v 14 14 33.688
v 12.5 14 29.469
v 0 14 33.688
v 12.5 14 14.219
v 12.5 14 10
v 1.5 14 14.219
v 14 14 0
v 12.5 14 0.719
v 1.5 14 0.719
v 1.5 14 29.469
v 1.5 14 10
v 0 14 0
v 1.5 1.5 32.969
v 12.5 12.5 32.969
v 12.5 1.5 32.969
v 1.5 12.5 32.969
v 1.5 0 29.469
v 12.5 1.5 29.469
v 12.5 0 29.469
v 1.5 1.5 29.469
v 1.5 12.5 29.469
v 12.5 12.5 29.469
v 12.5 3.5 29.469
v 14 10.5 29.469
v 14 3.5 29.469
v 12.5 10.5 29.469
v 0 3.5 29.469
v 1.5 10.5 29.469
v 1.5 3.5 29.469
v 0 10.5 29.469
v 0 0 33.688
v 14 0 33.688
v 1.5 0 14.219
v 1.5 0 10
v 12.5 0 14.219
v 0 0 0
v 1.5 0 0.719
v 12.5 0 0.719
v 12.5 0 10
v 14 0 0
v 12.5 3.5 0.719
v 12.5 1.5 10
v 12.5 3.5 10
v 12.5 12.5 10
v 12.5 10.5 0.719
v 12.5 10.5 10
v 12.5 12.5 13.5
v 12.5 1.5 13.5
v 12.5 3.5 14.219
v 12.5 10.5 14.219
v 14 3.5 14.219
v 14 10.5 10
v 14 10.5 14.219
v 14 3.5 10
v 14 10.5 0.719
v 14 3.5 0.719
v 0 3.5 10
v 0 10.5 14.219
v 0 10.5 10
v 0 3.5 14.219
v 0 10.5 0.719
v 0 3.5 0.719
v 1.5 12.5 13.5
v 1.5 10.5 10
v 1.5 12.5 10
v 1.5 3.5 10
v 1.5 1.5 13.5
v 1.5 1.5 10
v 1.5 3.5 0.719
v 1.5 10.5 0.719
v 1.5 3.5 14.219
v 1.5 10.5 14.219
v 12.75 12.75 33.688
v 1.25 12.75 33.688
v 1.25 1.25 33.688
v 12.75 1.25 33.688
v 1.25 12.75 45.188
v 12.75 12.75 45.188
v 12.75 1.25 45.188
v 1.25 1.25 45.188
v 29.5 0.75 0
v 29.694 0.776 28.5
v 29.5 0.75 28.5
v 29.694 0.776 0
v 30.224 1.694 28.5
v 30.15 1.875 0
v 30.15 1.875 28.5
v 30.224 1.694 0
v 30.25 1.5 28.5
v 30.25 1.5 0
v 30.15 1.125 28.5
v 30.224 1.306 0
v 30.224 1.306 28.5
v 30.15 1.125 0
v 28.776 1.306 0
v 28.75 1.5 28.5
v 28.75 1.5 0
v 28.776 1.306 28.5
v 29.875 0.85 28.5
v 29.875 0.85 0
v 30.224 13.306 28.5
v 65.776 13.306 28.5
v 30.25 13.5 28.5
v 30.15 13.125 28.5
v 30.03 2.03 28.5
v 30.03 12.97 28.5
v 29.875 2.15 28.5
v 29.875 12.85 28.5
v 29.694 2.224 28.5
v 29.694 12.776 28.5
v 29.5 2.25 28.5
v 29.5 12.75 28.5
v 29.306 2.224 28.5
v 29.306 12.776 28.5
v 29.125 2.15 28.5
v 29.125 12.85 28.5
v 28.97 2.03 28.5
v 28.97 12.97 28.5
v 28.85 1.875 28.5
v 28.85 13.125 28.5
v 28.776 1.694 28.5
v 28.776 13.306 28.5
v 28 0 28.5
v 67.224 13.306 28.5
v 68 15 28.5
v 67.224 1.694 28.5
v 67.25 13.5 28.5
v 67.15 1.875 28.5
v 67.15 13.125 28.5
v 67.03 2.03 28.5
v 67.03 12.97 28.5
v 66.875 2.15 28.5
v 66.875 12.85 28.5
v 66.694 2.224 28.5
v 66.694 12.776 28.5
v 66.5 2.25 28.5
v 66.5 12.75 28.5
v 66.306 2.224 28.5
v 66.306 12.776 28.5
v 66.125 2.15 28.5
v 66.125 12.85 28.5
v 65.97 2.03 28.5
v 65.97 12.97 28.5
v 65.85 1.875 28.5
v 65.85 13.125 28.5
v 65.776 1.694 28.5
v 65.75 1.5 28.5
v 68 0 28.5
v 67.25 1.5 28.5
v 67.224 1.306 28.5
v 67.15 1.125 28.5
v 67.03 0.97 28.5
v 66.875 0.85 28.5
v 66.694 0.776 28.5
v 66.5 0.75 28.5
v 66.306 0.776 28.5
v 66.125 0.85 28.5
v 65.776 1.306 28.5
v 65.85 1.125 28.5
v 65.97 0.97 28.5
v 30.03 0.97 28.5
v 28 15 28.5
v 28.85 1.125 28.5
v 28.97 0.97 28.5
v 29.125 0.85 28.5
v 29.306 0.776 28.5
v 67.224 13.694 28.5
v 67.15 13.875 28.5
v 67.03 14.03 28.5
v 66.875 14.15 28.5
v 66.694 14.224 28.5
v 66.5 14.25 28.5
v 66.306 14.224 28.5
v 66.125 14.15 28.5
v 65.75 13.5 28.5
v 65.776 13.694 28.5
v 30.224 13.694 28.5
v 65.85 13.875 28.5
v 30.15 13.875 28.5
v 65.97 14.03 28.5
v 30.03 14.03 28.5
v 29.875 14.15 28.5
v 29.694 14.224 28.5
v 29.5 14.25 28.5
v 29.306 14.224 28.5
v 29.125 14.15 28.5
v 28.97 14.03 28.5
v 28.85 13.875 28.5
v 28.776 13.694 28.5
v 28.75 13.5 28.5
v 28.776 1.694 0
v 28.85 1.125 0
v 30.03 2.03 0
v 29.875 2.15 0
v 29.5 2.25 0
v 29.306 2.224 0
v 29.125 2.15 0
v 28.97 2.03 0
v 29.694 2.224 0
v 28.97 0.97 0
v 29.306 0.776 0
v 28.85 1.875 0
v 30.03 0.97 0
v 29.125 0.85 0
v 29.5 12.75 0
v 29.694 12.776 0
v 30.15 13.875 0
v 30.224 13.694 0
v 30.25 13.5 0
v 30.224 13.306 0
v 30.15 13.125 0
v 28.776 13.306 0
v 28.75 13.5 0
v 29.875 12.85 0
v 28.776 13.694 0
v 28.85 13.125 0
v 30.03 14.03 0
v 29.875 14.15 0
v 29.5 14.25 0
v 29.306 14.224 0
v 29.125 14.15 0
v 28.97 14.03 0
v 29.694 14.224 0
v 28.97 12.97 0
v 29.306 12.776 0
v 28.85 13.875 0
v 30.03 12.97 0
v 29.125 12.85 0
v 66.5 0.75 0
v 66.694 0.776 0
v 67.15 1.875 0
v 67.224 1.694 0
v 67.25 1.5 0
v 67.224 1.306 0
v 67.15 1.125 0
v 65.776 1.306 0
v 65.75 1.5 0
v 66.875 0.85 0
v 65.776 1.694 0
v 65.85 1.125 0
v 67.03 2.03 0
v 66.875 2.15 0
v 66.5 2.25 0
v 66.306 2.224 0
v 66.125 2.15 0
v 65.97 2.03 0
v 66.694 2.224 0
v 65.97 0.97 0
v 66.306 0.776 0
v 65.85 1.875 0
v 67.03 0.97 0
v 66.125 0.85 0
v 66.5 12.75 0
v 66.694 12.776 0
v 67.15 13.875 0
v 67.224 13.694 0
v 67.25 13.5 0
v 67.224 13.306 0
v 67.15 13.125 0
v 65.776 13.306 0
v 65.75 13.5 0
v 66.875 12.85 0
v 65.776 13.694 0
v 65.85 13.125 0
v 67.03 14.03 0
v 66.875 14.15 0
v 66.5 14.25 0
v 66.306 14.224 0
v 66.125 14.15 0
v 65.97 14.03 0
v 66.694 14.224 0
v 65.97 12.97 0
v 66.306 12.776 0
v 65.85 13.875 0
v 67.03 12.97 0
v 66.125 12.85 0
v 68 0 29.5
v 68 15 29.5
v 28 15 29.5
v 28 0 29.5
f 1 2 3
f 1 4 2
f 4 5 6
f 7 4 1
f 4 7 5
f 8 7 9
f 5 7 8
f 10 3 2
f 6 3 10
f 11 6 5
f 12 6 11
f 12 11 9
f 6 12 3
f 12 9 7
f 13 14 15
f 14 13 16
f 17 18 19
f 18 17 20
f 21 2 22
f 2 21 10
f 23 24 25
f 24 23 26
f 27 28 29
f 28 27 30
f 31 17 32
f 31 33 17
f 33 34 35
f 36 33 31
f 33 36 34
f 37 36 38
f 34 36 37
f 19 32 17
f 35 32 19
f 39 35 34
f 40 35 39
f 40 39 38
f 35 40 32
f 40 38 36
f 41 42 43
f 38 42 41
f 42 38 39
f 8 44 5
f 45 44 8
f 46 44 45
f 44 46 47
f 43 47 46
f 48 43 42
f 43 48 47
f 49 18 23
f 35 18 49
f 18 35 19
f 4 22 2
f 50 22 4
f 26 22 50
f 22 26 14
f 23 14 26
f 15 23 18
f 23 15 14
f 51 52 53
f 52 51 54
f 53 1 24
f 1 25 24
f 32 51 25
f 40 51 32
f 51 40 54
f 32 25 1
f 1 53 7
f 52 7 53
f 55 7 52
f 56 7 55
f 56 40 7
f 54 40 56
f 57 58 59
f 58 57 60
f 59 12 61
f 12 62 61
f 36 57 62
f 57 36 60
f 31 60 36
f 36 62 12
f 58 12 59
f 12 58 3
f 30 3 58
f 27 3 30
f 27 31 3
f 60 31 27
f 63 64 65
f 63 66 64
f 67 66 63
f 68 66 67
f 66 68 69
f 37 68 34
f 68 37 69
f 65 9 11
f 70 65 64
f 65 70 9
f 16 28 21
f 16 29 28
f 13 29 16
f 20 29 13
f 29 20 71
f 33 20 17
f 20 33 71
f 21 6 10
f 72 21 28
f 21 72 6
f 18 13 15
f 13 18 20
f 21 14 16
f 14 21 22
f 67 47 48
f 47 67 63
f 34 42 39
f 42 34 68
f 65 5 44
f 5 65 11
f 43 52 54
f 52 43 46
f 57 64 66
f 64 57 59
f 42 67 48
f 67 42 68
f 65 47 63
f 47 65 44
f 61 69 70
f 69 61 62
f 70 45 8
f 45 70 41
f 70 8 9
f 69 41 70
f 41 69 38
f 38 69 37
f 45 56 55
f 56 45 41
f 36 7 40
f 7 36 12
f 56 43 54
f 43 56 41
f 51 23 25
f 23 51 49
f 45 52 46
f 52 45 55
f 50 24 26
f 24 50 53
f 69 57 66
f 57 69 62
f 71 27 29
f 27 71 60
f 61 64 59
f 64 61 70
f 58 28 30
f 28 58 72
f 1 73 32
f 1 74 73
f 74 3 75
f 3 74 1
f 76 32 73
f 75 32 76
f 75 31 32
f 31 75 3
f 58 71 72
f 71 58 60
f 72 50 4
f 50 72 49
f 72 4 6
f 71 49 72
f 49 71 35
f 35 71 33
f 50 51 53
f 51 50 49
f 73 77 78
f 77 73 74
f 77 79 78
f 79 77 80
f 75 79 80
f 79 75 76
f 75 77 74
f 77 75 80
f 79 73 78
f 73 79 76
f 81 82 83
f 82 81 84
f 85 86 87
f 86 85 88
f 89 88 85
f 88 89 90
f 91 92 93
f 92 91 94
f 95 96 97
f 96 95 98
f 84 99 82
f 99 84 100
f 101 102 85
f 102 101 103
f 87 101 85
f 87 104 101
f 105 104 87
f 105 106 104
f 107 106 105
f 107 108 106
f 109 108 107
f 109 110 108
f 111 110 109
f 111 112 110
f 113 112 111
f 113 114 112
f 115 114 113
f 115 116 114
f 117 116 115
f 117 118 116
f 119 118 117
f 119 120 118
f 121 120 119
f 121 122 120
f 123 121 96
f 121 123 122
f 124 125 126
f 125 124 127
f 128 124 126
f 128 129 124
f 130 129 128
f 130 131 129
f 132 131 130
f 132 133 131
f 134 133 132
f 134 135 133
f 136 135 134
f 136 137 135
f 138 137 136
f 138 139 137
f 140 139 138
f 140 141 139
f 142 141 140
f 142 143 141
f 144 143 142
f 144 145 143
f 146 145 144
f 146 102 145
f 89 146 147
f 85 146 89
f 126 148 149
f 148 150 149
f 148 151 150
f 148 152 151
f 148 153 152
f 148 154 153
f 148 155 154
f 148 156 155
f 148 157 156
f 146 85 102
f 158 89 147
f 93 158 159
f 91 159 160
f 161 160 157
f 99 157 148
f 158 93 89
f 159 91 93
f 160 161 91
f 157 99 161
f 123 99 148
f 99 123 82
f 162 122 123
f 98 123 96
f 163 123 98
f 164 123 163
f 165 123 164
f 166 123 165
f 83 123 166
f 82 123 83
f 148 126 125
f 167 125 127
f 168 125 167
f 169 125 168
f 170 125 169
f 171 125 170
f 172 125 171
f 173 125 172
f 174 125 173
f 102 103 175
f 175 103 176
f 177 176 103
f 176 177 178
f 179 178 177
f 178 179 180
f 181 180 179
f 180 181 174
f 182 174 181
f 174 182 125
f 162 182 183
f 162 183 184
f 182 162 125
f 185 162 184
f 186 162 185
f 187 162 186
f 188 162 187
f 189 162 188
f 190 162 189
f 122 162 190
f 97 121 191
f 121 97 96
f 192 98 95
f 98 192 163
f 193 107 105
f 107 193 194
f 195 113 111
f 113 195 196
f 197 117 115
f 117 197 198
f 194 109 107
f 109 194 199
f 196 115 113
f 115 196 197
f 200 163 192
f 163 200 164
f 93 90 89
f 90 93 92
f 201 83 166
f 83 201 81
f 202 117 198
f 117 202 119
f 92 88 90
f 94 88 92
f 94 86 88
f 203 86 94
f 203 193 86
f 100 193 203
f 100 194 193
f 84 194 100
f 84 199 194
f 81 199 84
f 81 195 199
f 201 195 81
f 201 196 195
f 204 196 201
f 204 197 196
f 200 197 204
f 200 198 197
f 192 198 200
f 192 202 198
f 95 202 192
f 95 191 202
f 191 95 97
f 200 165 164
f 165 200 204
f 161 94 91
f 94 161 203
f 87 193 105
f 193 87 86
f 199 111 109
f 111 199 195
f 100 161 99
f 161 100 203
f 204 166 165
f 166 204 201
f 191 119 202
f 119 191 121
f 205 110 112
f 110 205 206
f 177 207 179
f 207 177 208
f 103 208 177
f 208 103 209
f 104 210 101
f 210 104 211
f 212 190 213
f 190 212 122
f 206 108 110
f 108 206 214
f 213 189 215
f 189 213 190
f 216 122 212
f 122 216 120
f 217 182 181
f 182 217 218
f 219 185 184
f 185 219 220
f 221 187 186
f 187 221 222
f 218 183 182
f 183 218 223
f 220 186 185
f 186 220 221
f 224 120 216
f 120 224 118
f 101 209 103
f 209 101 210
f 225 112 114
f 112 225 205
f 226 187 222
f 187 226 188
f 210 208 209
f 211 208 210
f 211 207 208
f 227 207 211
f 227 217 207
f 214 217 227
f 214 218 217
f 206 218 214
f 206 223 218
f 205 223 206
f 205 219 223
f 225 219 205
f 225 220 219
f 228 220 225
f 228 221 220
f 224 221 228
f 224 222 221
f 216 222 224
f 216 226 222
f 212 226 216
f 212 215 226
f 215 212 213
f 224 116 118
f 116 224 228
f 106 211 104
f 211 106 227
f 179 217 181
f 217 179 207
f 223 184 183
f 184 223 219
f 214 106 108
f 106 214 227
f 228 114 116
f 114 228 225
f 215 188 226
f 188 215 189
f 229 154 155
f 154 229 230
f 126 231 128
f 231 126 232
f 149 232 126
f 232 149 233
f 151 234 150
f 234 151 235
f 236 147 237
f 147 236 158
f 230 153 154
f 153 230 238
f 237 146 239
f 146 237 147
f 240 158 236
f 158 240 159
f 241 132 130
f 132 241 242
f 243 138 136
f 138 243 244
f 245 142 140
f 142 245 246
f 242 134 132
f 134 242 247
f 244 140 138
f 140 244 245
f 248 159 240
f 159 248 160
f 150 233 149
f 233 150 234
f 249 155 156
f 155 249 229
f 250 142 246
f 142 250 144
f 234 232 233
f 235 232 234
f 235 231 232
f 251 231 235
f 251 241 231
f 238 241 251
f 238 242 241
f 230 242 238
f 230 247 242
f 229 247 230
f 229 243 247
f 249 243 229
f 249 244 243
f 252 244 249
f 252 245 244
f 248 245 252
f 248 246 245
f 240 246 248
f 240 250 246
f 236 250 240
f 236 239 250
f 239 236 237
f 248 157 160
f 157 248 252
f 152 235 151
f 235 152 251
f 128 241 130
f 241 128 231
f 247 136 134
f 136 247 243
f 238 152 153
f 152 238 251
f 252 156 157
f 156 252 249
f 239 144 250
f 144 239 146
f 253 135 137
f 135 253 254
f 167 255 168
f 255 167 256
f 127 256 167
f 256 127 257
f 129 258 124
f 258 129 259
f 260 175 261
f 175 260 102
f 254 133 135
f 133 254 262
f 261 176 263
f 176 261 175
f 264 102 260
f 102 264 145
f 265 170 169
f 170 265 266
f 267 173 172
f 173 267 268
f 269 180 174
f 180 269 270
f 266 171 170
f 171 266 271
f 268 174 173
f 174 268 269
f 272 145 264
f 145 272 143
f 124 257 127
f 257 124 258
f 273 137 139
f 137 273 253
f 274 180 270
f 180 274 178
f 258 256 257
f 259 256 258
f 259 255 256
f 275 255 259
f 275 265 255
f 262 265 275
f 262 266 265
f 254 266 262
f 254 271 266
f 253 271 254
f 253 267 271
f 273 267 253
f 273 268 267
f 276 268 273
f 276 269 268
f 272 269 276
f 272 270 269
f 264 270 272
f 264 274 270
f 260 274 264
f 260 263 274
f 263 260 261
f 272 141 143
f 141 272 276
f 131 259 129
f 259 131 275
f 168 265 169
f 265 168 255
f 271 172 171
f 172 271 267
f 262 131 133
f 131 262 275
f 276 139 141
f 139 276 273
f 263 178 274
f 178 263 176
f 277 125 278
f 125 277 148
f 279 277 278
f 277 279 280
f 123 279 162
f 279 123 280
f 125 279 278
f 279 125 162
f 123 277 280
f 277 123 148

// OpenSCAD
// 6-Gallon Cube Aquarium Stand — OpenSCAD Model
// All dimensions in inches (actual lumber sizes, not nominal)
//
// To view:  Open in OpenSCAD → press F5 (preview) or F6 (full render)
// To export: F6 to render, then File → Export as STL

/* --- Actual lumber dimensions --- */
t   = 1.5;     // 2x4 thickness (narrow face)
w   = 3.5;     // 2x4 width (wide face)
ply = 0.719;   // 3/4" plywood (actual 23/32")

/* --- Cut list lengths --- */
leg_len    = 32.25;
long_side  = 14;      // front/back frame pieces
short_side = 11;       // left/right frame pieces (fit between long sides)
panel      = 14;       // plywood squares

/* --- Z positions (from floor) --- */
base_z      = 0;
leg_z       = ply;                     // legs rest on base board
btm_frame_z = 10;                      // bottom frame ~10" from floor
shelf_z     = btm_frame_z + w;         // shelf sits on top of bottom frame
top_frame_z = leg_z + leg_len - w;     // top frame flush with leg tops
top_ply_z   = leg_z + leg_len;         // top panel on legs/frame

/* --- Colors --- */
c_wood = [0.1, 0.1, 0.1];
c_ply  = [0.1, 0.1, 0.1];

/* --- Modules --- */

module frame(z) {
    color(c_wood) {
        // Front long side (14" along X)
        translate([0, 0, z])
            cube([long_side, t, w]);
        // Back long side
        translate([0, panel - t, z])
            cube([long_side, t, w]);
        // Left short side (11" along Y, between long sides)
        translate([0, t, z])
            cube([t, short_side, w]);
        // Right short side
        translate([panel - t, t, z])
            cube([t, short_side, w]);
    }
}

module leg(x, y) {
    color(c_wood)
        translate([x, y, leg_z])
            cube([w, t, leg_len]);
}

module plywood_panel(z) {
    color(c_ply)
        translate([0, 0, z])
            cube([panel, panel, ply]);
}

/* --- Assembly --- */

// Stand rotated 90° so thin leg edges face front
translate([panel/2, panel/2, 0])
rotate([0, 0, 90])
translate([-panel/2, -panel/2, 0])
{
    // Base board (on floor, under everything)
    plywood_panel(base_z);

    // Legs (flush with outside corners, 3.5" along X, 1.5" along Y)
    leg(0, 0);                              // front-left
    leg(panel - w, 0);                      // front-right
    leg(0, panel - t);                      // back-left
    leg(panel - w, panel - t);              // back-right

    // Top frame (flush with top of legs)
    frame(top_frame_z);

    // Bottom frame (~10" from floor)
    frame(btm_frame_z);

    // Top panel (tank sits here)
    plywood_panel(top_ply_z);

    // Shelf panel (on top of bottom frame)
    plywood_panel(shelf_z);

    // 6-gallon cube tank (11.5" cube, centered on top panel)
    tank_size = 11.5;
    tank_offset = (panel - tank_size) / 2;
    color([0.6, 0.85, 1.0], 0.3)
        translate([tank_offset, tank_offset, top_ply_z + ply])
            cube([tank_size, tank_size, tank_size]);
}

// Computer desk (for scale reference, placed beside stand)
desk_x = panel + 14;   // 10" right of previous position
desk_l = 40;
desk_w = 15;
desk_h = 29.5;
desk_top_t = 1;
desk_leg_r = 0.75;     // leg radius
desk_leg_h = desk_h - desk_top_t;
desk_inset = 1.5;      // leg inset from edges

// Tabletop
color([0.72, 0.53, 0.34])
    translate([desk_x, 0, desk_leg_h])
        cube([desk_l, desk_w, desk_top_t]);

// Legs (black cylinders)
color([0.15, 0.15, 0.15])
for (x = [desk_x + desk_inset, desk_x + desk_l - desk_inset])
    for (y = [desk_inset, desk_w - desk_inset])
        translate([x, y, 0])
            cylinder(h = desk_leg_h, r = desk_leg_r, $fn = 24);
